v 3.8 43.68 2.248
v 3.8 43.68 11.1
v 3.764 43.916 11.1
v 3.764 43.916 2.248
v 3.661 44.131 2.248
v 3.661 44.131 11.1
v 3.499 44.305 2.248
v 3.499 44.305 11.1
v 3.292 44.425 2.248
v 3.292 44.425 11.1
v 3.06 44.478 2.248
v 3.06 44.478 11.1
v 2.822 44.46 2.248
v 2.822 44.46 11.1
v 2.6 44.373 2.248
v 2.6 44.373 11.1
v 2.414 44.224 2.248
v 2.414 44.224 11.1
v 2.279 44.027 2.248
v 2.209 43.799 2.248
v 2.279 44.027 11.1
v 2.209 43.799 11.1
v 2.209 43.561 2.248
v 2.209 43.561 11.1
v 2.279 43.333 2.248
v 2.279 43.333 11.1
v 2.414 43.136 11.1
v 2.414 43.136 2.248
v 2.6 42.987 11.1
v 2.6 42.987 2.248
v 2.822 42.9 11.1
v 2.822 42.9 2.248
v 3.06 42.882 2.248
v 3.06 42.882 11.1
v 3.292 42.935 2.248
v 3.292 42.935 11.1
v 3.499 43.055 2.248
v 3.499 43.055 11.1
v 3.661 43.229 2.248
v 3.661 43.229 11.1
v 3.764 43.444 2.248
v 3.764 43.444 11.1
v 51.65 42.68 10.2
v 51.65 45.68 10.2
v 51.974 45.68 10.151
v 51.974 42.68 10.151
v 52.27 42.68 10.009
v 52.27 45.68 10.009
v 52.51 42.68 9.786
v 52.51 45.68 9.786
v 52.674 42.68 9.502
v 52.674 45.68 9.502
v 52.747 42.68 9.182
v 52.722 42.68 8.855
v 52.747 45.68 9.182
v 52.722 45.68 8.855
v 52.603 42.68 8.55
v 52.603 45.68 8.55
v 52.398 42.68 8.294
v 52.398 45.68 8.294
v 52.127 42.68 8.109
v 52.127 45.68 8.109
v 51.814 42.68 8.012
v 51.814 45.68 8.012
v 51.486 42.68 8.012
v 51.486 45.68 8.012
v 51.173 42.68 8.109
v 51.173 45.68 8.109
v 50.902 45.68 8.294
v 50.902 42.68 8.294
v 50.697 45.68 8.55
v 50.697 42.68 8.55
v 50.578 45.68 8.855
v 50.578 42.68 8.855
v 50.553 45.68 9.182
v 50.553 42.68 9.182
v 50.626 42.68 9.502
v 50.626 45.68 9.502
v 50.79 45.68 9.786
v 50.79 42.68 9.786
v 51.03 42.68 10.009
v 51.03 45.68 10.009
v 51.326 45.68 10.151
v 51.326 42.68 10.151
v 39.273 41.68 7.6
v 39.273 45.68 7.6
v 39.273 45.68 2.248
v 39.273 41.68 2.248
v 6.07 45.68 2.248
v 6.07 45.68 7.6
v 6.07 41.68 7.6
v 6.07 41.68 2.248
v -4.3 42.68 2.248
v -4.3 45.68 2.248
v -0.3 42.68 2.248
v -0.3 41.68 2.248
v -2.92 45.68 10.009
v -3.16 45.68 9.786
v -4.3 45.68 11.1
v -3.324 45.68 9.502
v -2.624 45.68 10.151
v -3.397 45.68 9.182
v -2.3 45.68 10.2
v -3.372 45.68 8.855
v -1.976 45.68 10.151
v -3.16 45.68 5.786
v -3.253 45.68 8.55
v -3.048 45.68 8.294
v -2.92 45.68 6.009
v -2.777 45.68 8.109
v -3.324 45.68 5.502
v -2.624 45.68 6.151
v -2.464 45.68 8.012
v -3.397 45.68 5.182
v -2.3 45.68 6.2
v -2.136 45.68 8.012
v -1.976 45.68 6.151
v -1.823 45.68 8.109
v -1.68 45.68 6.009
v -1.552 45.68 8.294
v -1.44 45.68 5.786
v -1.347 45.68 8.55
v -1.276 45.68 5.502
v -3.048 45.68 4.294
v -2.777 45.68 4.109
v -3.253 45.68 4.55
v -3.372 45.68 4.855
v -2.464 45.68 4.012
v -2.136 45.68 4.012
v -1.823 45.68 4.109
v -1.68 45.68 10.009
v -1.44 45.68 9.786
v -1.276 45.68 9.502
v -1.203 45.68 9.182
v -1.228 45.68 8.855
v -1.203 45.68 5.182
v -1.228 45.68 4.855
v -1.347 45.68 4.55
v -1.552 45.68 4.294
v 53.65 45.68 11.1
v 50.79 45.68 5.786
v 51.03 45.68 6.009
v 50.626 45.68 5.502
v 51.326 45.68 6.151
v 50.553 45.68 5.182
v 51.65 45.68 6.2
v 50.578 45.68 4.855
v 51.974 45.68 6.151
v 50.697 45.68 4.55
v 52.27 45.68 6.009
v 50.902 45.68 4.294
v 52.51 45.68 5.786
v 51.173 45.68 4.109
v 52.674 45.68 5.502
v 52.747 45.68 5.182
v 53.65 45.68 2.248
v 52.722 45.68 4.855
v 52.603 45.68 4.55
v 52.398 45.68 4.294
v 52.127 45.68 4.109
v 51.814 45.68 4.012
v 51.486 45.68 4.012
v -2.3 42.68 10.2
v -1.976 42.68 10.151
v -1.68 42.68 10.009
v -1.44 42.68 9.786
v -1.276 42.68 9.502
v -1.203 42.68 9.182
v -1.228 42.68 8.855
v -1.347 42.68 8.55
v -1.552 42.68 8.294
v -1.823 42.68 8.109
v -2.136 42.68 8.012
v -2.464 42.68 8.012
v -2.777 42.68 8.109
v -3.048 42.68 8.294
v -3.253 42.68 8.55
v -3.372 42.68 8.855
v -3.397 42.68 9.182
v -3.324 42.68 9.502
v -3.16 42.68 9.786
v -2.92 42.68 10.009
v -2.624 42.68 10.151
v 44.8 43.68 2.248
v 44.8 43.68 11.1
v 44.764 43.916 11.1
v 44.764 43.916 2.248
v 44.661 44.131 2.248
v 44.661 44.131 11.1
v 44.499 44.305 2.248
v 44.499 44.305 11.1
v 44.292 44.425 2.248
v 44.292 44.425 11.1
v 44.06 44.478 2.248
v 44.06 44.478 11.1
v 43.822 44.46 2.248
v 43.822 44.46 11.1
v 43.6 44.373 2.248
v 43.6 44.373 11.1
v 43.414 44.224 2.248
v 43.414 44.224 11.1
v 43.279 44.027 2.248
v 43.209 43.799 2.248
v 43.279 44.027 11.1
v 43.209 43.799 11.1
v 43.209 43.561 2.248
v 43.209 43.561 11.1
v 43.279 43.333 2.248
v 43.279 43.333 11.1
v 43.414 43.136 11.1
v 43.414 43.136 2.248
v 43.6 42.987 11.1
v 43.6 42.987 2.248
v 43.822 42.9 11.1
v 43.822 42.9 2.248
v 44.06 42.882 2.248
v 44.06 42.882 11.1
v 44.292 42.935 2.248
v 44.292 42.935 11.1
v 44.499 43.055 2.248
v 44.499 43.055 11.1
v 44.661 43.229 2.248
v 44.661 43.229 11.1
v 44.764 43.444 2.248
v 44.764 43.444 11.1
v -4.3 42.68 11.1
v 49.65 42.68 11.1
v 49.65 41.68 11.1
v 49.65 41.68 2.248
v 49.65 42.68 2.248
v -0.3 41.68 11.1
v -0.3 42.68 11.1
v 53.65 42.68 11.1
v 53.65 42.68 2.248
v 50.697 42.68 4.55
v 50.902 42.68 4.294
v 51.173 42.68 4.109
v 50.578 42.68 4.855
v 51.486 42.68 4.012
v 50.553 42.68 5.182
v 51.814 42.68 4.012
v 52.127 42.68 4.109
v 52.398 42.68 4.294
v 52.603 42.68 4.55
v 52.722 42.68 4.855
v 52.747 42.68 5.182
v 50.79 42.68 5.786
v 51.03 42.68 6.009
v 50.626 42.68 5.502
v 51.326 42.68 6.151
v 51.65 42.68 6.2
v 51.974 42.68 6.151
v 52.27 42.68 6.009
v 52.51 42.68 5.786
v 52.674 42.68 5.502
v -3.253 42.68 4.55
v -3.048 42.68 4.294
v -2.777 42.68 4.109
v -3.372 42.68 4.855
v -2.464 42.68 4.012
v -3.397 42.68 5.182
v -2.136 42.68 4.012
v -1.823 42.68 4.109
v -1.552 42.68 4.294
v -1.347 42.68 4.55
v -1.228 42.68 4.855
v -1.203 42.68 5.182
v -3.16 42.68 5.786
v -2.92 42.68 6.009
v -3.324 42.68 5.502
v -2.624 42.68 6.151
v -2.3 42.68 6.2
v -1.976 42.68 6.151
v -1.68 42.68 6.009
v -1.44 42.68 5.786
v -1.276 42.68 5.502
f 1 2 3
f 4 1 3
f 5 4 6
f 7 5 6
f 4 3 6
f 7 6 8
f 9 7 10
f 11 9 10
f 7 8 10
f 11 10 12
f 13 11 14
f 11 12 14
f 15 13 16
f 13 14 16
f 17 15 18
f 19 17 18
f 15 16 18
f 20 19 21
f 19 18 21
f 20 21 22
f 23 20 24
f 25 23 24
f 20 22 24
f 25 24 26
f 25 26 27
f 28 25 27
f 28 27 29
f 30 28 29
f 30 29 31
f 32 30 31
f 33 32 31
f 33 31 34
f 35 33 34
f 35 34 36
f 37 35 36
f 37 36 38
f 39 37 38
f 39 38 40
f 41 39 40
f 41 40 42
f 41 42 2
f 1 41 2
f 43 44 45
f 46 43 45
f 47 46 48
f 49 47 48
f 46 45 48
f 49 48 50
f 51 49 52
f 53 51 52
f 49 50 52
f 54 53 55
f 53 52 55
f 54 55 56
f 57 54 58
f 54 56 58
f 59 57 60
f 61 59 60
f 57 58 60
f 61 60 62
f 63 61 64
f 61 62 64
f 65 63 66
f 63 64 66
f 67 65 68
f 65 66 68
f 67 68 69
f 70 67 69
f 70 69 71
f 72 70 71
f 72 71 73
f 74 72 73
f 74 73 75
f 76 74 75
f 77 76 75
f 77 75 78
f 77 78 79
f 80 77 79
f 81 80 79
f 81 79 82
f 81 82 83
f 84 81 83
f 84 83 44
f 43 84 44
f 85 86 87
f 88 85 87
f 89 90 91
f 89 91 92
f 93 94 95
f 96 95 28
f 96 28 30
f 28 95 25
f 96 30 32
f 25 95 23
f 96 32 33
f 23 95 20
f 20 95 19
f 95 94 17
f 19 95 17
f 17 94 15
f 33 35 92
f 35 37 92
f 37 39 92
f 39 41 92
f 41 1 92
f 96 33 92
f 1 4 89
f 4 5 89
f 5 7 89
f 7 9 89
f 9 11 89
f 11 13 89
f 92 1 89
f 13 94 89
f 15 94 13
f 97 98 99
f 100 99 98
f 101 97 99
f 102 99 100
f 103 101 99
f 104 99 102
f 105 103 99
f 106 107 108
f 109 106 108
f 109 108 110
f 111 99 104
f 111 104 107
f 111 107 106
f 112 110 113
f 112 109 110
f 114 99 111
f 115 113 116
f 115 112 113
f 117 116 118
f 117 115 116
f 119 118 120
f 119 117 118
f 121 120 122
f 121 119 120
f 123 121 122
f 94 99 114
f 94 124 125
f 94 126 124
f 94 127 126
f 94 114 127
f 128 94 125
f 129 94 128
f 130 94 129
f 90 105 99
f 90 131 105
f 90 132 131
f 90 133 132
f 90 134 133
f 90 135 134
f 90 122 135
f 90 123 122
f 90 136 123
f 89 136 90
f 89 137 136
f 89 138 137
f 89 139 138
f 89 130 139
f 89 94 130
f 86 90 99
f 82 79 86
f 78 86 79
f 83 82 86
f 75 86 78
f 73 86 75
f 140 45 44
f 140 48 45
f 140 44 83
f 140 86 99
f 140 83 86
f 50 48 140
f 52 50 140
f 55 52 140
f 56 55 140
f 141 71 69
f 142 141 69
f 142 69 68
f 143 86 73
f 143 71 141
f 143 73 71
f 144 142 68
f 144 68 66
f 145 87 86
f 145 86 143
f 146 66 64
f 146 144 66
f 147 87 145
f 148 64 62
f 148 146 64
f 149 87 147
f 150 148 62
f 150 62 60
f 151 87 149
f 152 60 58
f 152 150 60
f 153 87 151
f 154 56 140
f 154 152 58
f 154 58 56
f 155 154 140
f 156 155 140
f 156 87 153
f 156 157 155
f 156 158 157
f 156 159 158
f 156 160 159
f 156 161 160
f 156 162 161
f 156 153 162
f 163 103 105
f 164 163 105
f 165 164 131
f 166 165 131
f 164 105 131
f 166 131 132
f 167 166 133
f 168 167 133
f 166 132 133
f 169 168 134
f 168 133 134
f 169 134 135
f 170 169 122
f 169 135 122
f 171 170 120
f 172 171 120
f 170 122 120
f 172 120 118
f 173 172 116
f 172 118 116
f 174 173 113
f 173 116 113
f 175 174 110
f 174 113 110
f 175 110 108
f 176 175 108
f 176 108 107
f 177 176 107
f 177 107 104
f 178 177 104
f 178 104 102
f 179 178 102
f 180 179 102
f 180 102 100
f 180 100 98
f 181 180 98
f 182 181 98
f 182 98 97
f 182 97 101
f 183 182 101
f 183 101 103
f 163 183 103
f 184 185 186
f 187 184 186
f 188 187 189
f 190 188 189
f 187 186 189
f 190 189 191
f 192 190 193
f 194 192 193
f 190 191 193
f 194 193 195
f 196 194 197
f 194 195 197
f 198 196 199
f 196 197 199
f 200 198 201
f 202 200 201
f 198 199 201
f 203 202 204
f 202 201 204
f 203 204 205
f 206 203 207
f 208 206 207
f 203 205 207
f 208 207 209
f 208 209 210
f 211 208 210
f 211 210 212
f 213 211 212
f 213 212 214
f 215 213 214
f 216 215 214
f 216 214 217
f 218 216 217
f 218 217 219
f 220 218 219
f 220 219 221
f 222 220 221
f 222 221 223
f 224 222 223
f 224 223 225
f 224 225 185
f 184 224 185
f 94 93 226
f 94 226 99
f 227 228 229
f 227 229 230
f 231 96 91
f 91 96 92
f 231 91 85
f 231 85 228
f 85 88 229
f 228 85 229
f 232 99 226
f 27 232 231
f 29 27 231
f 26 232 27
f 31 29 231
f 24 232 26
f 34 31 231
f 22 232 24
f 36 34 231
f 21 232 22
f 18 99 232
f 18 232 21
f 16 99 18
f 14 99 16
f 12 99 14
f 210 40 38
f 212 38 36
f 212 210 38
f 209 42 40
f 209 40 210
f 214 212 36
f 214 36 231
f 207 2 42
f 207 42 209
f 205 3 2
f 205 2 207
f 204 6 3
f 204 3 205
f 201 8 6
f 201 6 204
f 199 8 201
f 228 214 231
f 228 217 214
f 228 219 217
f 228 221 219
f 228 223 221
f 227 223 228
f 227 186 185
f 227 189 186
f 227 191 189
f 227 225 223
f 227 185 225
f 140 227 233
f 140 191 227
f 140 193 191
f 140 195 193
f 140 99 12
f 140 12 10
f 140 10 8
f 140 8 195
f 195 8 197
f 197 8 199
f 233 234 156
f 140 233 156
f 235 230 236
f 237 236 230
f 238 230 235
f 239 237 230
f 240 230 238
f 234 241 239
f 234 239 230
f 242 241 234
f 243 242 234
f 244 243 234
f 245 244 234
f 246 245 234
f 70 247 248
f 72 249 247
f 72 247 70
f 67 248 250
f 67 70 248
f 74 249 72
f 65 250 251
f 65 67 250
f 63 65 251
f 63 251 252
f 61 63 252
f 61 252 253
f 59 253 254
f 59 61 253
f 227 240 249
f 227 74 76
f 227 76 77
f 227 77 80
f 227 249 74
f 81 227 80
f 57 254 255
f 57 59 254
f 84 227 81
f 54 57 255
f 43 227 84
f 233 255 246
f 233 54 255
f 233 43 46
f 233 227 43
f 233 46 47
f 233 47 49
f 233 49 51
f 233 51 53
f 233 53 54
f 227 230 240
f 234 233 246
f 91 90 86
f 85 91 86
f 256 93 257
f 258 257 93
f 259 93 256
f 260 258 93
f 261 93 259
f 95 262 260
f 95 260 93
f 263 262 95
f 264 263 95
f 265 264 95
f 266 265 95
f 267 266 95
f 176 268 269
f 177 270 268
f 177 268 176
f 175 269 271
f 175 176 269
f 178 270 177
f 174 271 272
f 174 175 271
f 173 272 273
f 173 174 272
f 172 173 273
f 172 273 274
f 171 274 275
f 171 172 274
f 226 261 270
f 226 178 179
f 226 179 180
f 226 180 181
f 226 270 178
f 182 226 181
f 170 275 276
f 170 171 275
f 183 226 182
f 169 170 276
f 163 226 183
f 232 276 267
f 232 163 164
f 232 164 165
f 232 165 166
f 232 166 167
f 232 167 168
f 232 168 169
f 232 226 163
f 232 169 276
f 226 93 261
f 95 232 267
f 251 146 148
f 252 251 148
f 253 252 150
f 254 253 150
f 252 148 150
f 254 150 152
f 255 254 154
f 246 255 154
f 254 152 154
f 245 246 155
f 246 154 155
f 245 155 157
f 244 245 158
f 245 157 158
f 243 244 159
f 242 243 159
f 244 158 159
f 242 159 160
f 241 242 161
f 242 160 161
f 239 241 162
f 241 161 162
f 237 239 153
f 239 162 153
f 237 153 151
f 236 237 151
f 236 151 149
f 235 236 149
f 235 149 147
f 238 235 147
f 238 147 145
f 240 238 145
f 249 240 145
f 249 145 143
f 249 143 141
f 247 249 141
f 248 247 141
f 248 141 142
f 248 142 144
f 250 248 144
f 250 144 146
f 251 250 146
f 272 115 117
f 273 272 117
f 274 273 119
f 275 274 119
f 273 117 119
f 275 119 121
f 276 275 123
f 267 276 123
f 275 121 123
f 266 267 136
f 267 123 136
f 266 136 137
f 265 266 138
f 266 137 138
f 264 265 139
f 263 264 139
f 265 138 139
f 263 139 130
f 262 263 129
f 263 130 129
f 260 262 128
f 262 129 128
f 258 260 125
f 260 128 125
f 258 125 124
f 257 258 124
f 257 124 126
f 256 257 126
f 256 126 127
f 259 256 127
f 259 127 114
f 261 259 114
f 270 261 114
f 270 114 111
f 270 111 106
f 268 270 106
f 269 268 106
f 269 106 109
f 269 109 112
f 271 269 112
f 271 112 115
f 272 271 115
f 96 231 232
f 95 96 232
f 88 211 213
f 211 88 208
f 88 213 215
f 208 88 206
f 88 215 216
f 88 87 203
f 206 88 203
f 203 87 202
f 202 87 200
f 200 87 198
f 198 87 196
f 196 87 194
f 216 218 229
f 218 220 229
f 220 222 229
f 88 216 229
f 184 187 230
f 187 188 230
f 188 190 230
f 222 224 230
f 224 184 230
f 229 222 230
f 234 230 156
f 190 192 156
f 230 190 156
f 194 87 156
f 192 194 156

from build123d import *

# Parameters (mm, degrees)
MAIN_STOCK_START                         = 2.248090434
SKETCH_1_W                               = 57.95
SKETCH_1_H                               = 4
MAIN_STOCK_DEPTH                         = 8.851909566
SKETCH_2_W                               = 4
SKETCH_2_H                               = 1
CORNER_LEFT_RECTANGULAR_NOTCH_4X1_DEPTH  = 8.851909566
SKETCH_3_W                               = 4
SKETCH_3_H                               = 1
CORNER_RIGHT_RECTANGULAR_NOTCH_4X1_DEPTH = 8.851909566
SKETCH_4_R                               = 0.8
FRAME_2XD1P6_THROUGH_DEPTH               = 72.016485431
SKETCH_5_W                               = 33.203
SKETCH_5_H                               = 6.7
MERGED_INTERFACE_WINDOW_33P203X6P7_DEPTH = 4
SKETCH_6_R                               = 1.1
CORNER_REAR_4XD2P2_THROUGH_DEPTH         = 55.932071689


with BuildPart() as part:
    # 草图1 → Main_Stock (new body)
    with BuildSketch(Plane.XY.offset(MAIN_STOCK_START)):
        with Locations((24.675, 43.68)):
            Rectangle(SKETCH_1_W, SKETCH_1_H)
    extrude(amount=MAIN_STOCK_DEPTH)

    # 草图2 → Corner_Left_Rectangular_Notch_4x1 (cut)
    with BuildSketch(Plane.XY.offset(11.1)):
        with Locations((-2.3, 42.18)):
            Rectangle(SKETCH_2_W, SKETCH_2_H)
    extrude(amount=-CORNER_LEFT_RECTANGULAR_NOTCH_4X1_DEPTH, mode=Mode.SUBTRACT)

    # 草图3 → Corner_Right_Rectangular_Notch_4x1 (cut)
    with BuildSketch(Plane.XY.offset(11.1)):
        with Locations((51.65, 42.18)):
            Rectangle(SKETCH_3_W, SKETCH_3_H)
    extrude(amount=-CORNER_RIGHT_RECTANGULAR_NOTCH_4X1_DEPTH, mode=Mode.SUBTRACT)

    # 草图4 → Frame_2xD1p6_Through (cut, through all)
    with BuildSketch(Plane.XY.offset(11.1)):
        with Locations((3, 43.68)):
            Circle(SKETCH_4_R)
        with Locations((44, 43.68)):
            Circle(SKETCH_4_R)
    extrude(amount=-FRAME_2XD1P6_THROUGH_DEPTH, mode=Mode.SUBTRACT)

    # 草图5 → Merged_Interface_Window_33p203x6p7 (cut)
    with BuildSketch(Plane(origin=(0, 45.68, 0), x_dir=(1, 0, 0), z_dir=(0, 1, 0))):
        with Locations((22.6715, -4.25)):
            Rectangle(SKETCH_5_W, SKETCH_5_H)
    extrude(amount=-MERGED_INTERFACE_WINDOW_33P203X6P7_DEPTH, mode=Mode.SUBTRACT)

    # 草图6 → Corner_Rear_4xD2p2_Through (cut, through all)
    with BuildSketch(Plane(origin=(0, 45.68, 0), x_dir=(1, 0, 0), z_dir=(0, 1, 0))):
        with Locations(Location((-2.3, -5.1, 0), (0, 0, 270))):
            Circle(SKETCH_6_R)
        with Locations(Location((-2.3, -9.1, 0), (0, 0, 270))):
            Circle(SKETCH_6_R)
        with Locations(Location((51.65, -5.1, 0), (0, 0, 270))):
            Circle(SKETCH_6_R)
        with Locations(Location((51.65, -9.1, 0), (0, 0, 270))):
            Circle(SKETCH_6_R)
    extrude(amount=-CORNER_REAR_4XD2P2_THROUGH_DEPTH, mode=Mode.SUBTRACT)


solid = part.part
